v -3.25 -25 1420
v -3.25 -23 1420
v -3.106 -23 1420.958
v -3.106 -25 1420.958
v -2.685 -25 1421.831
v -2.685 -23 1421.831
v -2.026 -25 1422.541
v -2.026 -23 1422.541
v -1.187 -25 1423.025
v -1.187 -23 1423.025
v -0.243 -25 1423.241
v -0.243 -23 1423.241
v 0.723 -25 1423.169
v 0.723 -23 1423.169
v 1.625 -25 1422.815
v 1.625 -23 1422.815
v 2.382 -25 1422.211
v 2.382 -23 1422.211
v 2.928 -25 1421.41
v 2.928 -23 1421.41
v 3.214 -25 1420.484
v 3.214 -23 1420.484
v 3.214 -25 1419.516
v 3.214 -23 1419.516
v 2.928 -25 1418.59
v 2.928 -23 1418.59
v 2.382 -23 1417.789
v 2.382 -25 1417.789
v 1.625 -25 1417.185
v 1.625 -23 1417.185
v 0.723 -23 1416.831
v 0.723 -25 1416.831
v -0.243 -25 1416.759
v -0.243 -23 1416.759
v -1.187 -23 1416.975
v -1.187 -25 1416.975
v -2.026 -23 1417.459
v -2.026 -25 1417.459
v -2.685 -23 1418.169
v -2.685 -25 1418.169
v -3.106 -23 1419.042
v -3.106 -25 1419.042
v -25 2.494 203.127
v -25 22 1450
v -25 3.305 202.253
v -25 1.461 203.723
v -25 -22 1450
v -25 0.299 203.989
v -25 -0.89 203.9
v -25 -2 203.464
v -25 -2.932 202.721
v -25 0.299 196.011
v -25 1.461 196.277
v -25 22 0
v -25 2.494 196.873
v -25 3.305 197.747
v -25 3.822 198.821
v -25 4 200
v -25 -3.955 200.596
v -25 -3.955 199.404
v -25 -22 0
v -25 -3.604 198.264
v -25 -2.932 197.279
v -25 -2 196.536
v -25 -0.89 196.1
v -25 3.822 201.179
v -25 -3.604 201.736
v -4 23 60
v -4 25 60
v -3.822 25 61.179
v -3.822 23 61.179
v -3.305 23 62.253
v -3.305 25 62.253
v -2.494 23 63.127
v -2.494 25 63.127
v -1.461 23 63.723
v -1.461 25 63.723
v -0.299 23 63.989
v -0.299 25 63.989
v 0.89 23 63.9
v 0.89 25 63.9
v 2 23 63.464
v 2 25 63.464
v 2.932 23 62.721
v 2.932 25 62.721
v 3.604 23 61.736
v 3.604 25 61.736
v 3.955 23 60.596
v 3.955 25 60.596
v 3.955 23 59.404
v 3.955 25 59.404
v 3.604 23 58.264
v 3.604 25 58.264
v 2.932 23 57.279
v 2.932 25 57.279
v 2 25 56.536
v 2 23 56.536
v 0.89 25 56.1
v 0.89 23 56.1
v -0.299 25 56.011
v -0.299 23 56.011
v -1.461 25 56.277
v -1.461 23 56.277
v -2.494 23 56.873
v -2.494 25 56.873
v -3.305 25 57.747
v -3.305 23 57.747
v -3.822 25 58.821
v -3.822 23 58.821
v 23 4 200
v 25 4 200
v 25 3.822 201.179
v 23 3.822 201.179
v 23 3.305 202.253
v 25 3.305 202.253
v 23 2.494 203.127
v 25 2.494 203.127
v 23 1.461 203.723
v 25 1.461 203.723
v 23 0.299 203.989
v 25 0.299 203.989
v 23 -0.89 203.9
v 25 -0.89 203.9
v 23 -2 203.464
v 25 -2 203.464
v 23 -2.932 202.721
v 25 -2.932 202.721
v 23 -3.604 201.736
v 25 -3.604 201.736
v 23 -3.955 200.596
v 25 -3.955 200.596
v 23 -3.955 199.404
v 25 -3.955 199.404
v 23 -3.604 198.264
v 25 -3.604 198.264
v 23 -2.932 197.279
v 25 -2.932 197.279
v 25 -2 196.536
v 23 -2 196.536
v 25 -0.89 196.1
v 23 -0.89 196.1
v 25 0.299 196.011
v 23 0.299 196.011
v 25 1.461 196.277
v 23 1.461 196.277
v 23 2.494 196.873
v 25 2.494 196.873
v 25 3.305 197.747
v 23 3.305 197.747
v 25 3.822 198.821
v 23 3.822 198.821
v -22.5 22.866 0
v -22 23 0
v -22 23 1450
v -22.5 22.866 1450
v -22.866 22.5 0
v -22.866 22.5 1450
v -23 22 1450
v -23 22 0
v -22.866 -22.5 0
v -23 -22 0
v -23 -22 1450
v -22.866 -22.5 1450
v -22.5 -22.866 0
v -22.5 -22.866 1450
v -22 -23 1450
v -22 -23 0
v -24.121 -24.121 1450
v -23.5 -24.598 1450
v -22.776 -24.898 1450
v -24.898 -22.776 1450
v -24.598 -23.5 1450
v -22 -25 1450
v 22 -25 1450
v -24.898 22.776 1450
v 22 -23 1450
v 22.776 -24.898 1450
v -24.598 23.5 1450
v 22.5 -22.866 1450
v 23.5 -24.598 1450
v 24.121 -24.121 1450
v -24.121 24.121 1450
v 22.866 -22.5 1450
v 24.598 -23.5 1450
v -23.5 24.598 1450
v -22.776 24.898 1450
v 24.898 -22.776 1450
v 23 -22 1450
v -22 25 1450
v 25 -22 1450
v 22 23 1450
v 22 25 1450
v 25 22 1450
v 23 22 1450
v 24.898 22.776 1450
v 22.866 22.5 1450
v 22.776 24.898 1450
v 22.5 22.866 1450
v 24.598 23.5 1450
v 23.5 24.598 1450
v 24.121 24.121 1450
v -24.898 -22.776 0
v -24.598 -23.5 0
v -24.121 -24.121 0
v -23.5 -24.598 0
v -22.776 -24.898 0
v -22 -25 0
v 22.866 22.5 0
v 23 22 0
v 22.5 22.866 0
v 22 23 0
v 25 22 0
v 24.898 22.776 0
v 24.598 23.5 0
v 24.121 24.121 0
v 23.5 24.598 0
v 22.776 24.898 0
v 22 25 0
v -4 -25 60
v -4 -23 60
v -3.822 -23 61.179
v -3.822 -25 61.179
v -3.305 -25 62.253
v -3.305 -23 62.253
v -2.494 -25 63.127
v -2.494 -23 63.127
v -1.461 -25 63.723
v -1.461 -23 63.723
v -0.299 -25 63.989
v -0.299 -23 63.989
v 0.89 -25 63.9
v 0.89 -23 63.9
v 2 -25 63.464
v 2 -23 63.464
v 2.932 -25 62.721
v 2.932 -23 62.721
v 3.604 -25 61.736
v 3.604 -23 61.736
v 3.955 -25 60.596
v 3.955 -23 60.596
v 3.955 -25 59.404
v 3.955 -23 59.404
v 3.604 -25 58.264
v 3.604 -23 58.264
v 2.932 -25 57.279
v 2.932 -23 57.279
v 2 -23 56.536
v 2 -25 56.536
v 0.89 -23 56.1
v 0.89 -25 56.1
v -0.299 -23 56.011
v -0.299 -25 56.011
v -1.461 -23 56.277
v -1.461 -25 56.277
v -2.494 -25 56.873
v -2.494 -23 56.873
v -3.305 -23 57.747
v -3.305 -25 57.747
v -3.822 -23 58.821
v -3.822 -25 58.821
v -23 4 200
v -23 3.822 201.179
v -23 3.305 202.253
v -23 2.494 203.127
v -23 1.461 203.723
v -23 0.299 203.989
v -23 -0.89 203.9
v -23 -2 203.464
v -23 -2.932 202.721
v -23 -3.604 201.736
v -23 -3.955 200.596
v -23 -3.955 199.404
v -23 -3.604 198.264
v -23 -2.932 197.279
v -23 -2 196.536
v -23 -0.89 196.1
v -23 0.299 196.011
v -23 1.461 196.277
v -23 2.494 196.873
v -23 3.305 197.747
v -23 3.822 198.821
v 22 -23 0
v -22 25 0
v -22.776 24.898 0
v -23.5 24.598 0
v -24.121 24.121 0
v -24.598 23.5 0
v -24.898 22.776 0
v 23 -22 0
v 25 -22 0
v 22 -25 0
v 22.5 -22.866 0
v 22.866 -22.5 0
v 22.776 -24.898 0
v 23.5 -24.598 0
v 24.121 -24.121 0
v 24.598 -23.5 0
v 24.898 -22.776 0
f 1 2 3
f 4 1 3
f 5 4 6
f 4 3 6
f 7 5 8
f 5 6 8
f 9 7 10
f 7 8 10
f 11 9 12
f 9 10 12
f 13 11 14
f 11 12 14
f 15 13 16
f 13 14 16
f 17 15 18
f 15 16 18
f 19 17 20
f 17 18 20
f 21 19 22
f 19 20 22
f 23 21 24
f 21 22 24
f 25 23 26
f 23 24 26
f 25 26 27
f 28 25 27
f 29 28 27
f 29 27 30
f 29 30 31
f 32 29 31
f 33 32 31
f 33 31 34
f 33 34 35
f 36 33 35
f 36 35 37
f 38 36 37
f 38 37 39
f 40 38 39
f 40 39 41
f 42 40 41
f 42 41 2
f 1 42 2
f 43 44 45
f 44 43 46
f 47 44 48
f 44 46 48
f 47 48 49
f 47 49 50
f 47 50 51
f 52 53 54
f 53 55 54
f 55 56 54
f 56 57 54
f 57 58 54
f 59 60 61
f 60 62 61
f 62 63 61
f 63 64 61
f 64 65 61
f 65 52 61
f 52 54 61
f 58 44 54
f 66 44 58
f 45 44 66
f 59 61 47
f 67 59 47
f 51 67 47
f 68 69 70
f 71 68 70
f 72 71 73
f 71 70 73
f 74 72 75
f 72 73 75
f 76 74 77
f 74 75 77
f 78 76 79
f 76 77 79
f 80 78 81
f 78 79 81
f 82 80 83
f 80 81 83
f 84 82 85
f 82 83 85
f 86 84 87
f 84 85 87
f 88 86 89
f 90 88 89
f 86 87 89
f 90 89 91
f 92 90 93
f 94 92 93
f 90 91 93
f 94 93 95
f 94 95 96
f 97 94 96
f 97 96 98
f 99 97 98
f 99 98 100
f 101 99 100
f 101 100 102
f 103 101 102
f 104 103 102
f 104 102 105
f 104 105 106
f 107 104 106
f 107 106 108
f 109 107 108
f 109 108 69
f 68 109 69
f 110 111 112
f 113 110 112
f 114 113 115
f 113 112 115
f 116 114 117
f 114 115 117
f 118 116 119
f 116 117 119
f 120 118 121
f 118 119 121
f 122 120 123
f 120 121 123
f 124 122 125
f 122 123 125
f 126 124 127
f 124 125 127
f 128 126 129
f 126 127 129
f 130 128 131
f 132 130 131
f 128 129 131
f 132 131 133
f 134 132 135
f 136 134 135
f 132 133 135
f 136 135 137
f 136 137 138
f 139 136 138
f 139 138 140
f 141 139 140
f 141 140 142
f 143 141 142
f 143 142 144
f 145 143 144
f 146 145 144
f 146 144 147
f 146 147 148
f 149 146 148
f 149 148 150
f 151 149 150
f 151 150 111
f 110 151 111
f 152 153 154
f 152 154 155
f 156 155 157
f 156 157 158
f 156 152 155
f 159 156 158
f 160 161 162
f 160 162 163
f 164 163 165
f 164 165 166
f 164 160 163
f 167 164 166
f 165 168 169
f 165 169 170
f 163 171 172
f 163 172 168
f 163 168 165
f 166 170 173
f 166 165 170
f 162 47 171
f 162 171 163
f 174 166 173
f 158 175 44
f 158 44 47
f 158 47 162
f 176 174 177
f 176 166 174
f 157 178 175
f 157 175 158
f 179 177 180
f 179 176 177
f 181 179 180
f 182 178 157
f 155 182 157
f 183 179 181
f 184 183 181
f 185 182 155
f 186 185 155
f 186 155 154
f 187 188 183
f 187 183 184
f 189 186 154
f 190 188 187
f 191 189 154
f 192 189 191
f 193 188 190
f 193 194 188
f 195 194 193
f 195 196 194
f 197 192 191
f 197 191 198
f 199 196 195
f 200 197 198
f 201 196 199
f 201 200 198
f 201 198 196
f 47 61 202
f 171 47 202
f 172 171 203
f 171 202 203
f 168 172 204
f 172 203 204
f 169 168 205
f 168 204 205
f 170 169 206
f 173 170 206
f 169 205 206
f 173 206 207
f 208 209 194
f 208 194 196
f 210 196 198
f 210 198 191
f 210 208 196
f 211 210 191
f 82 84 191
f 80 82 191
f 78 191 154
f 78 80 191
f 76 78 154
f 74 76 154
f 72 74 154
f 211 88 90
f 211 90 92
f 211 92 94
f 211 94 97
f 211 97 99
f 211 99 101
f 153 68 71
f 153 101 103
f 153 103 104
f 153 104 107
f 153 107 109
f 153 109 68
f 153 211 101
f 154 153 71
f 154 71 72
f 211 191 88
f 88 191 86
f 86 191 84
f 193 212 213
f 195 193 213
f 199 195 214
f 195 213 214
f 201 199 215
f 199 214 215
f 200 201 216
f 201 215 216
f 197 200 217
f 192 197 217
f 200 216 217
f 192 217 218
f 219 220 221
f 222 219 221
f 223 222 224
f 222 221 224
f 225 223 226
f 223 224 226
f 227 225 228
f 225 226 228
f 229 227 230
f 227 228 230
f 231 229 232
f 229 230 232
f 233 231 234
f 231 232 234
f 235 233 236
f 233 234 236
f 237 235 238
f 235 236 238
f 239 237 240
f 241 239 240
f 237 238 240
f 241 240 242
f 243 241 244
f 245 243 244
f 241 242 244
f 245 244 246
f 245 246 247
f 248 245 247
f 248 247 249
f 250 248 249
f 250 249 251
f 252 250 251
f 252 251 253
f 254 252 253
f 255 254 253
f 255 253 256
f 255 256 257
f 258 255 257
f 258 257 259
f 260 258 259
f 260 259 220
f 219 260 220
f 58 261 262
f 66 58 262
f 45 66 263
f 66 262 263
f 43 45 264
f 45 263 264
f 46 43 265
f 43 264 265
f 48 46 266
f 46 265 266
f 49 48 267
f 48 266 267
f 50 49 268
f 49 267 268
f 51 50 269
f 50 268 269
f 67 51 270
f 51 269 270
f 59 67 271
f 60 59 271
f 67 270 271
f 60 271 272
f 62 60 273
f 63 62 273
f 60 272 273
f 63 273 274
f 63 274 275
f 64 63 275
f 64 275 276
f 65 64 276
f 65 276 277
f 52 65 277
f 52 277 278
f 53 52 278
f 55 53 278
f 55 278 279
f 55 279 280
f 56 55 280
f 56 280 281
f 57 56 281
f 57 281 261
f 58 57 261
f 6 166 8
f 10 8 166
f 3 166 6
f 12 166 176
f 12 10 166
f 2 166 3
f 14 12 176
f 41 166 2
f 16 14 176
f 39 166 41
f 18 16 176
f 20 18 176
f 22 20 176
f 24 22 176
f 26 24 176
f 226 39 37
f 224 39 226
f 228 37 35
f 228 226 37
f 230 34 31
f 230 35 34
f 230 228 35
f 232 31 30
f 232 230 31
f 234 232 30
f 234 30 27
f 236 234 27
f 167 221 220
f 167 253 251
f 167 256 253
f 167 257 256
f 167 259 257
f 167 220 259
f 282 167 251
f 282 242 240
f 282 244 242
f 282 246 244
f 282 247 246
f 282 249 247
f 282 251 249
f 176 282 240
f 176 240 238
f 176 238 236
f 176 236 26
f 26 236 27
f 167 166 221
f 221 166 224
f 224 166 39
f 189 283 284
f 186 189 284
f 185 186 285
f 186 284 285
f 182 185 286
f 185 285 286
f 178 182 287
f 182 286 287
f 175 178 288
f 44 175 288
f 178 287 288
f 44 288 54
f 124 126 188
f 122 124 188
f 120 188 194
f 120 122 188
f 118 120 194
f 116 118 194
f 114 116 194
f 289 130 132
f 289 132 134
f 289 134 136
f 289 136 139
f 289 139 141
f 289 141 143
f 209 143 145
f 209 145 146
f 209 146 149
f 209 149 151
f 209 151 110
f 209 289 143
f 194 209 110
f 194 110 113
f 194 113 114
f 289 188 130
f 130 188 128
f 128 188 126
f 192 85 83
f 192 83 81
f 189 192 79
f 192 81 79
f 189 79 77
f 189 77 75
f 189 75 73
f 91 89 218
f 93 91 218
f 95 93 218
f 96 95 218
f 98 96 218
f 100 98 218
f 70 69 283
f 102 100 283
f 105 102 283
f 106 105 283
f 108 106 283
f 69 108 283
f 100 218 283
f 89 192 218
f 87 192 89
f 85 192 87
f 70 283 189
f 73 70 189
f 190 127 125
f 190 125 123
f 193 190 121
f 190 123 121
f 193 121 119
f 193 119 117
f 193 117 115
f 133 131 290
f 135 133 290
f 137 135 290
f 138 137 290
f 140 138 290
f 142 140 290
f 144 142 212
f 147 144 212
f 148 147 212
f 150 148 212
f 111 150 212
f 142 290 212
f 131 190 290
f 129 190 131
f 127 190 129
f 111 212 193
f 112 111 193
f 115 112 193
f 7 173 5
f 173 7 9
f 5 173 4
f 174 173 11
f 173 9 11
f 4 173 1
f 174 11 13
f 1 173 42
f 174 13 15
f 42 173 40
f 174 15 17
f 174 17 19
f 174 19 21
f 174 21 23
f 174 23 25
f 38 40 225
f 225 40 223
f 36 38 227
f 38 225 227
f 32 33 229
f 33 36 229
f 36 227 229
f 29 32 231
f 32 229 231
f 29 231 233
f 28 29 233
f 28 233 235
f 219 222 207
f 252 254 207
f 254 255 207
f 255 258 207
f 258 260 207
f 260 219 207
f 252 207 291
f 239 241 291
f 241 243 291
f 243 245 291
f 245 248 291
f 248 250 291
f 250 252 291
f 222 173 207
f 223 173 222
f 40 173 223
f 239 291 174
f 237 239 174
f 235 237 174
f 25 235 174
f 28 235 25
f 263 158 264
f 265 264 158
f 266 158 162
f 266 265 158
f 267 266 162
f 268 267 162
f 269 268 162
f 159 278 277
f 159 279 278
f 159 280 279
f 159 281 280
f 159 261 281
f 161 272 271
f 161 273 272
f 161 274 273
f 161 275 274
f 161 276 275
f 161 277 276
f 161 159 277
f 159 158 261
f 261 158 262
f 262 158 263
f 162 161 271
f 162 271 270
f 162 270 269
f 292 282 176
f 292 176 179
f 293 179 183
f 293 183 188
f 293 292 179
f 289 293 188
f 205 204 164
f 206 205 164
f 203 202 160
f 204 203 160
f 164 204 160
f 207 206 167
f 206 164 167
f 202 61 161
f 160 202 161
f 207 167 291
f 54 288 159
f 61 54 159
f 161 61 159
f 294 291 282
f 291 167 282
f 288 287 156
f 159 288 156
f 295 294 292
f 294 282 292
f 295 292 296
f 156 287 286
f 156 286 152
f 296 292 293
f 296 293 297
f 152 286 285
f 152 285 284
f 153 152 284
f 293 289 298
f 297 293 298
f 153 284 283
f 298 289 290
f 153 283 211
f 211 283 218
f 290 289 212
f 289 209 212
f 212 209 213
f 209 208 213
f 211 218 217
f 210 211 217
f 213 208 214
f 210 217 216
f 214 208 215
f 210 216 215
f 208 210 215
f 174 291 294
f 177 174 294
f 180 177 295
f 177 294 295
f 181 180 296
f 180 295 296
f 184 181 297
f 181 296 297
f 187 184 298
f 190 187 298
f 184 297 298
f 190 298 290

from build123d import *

# Parameters (mm, degrees)
F1_DEPTH = 1450
F2_T     = -2
F4_D     = 6.5
F4_DEPTH = 25
F6_D     = 8
F8_D     = 8


with BuildPart() as f1:
    # F0 (on Top) → F1 (new body)
    with BuildSketch(Plane.XY):
        with BuildLine():
            ThreePointArc((-25, -22), (-24.12132, -24.12132), (-22, -25))
            Line((-22, -25), (22, -25))
            ThreePointArc((22, -25), (24.12132, -24.12132), (25, -22))
            Line((25, -22), (25, 22))
            ThreePointArc((25, 22), (24.12132, 24.12132), (22, 25))
            Line((22, 25), (-22, 25))
            ThreePointArc((-22, 25), (-24.12132, 24.12132), (-25, 22))
            Line((-25, 22), (-25, -22))
        make_face()
    extrude(amount=F1_DEPTH)

    # F2
    f2_openings = [f1.faces().sort_by_distance(p)[0] for p in [
        (0, 0, 1450),
        (0, 0, 0),
    ]]
    offset(amount=F2_T, openings=f2_openings)

    # F4
    with Locations(Plane.XZ.offset(25)):
        with Locations((0, 1420)):
            Hole(F4_D / 2, depth=F4_DEPTH)

    # F6 (through all)
    with Locations(Plane.XZ.offset(25)):
        with Locations((0, 60)):
            Hole(F6_D / 2)

    # F8 (through all)
    with Locations(Plane(origin=(-25, 0, 0), x_dir=(0, -1, 0), z_dir=(-1, 0, 0))):
        with Locations((0, 200)):
            Hole(F8_D / 2)


solid = f1.part
